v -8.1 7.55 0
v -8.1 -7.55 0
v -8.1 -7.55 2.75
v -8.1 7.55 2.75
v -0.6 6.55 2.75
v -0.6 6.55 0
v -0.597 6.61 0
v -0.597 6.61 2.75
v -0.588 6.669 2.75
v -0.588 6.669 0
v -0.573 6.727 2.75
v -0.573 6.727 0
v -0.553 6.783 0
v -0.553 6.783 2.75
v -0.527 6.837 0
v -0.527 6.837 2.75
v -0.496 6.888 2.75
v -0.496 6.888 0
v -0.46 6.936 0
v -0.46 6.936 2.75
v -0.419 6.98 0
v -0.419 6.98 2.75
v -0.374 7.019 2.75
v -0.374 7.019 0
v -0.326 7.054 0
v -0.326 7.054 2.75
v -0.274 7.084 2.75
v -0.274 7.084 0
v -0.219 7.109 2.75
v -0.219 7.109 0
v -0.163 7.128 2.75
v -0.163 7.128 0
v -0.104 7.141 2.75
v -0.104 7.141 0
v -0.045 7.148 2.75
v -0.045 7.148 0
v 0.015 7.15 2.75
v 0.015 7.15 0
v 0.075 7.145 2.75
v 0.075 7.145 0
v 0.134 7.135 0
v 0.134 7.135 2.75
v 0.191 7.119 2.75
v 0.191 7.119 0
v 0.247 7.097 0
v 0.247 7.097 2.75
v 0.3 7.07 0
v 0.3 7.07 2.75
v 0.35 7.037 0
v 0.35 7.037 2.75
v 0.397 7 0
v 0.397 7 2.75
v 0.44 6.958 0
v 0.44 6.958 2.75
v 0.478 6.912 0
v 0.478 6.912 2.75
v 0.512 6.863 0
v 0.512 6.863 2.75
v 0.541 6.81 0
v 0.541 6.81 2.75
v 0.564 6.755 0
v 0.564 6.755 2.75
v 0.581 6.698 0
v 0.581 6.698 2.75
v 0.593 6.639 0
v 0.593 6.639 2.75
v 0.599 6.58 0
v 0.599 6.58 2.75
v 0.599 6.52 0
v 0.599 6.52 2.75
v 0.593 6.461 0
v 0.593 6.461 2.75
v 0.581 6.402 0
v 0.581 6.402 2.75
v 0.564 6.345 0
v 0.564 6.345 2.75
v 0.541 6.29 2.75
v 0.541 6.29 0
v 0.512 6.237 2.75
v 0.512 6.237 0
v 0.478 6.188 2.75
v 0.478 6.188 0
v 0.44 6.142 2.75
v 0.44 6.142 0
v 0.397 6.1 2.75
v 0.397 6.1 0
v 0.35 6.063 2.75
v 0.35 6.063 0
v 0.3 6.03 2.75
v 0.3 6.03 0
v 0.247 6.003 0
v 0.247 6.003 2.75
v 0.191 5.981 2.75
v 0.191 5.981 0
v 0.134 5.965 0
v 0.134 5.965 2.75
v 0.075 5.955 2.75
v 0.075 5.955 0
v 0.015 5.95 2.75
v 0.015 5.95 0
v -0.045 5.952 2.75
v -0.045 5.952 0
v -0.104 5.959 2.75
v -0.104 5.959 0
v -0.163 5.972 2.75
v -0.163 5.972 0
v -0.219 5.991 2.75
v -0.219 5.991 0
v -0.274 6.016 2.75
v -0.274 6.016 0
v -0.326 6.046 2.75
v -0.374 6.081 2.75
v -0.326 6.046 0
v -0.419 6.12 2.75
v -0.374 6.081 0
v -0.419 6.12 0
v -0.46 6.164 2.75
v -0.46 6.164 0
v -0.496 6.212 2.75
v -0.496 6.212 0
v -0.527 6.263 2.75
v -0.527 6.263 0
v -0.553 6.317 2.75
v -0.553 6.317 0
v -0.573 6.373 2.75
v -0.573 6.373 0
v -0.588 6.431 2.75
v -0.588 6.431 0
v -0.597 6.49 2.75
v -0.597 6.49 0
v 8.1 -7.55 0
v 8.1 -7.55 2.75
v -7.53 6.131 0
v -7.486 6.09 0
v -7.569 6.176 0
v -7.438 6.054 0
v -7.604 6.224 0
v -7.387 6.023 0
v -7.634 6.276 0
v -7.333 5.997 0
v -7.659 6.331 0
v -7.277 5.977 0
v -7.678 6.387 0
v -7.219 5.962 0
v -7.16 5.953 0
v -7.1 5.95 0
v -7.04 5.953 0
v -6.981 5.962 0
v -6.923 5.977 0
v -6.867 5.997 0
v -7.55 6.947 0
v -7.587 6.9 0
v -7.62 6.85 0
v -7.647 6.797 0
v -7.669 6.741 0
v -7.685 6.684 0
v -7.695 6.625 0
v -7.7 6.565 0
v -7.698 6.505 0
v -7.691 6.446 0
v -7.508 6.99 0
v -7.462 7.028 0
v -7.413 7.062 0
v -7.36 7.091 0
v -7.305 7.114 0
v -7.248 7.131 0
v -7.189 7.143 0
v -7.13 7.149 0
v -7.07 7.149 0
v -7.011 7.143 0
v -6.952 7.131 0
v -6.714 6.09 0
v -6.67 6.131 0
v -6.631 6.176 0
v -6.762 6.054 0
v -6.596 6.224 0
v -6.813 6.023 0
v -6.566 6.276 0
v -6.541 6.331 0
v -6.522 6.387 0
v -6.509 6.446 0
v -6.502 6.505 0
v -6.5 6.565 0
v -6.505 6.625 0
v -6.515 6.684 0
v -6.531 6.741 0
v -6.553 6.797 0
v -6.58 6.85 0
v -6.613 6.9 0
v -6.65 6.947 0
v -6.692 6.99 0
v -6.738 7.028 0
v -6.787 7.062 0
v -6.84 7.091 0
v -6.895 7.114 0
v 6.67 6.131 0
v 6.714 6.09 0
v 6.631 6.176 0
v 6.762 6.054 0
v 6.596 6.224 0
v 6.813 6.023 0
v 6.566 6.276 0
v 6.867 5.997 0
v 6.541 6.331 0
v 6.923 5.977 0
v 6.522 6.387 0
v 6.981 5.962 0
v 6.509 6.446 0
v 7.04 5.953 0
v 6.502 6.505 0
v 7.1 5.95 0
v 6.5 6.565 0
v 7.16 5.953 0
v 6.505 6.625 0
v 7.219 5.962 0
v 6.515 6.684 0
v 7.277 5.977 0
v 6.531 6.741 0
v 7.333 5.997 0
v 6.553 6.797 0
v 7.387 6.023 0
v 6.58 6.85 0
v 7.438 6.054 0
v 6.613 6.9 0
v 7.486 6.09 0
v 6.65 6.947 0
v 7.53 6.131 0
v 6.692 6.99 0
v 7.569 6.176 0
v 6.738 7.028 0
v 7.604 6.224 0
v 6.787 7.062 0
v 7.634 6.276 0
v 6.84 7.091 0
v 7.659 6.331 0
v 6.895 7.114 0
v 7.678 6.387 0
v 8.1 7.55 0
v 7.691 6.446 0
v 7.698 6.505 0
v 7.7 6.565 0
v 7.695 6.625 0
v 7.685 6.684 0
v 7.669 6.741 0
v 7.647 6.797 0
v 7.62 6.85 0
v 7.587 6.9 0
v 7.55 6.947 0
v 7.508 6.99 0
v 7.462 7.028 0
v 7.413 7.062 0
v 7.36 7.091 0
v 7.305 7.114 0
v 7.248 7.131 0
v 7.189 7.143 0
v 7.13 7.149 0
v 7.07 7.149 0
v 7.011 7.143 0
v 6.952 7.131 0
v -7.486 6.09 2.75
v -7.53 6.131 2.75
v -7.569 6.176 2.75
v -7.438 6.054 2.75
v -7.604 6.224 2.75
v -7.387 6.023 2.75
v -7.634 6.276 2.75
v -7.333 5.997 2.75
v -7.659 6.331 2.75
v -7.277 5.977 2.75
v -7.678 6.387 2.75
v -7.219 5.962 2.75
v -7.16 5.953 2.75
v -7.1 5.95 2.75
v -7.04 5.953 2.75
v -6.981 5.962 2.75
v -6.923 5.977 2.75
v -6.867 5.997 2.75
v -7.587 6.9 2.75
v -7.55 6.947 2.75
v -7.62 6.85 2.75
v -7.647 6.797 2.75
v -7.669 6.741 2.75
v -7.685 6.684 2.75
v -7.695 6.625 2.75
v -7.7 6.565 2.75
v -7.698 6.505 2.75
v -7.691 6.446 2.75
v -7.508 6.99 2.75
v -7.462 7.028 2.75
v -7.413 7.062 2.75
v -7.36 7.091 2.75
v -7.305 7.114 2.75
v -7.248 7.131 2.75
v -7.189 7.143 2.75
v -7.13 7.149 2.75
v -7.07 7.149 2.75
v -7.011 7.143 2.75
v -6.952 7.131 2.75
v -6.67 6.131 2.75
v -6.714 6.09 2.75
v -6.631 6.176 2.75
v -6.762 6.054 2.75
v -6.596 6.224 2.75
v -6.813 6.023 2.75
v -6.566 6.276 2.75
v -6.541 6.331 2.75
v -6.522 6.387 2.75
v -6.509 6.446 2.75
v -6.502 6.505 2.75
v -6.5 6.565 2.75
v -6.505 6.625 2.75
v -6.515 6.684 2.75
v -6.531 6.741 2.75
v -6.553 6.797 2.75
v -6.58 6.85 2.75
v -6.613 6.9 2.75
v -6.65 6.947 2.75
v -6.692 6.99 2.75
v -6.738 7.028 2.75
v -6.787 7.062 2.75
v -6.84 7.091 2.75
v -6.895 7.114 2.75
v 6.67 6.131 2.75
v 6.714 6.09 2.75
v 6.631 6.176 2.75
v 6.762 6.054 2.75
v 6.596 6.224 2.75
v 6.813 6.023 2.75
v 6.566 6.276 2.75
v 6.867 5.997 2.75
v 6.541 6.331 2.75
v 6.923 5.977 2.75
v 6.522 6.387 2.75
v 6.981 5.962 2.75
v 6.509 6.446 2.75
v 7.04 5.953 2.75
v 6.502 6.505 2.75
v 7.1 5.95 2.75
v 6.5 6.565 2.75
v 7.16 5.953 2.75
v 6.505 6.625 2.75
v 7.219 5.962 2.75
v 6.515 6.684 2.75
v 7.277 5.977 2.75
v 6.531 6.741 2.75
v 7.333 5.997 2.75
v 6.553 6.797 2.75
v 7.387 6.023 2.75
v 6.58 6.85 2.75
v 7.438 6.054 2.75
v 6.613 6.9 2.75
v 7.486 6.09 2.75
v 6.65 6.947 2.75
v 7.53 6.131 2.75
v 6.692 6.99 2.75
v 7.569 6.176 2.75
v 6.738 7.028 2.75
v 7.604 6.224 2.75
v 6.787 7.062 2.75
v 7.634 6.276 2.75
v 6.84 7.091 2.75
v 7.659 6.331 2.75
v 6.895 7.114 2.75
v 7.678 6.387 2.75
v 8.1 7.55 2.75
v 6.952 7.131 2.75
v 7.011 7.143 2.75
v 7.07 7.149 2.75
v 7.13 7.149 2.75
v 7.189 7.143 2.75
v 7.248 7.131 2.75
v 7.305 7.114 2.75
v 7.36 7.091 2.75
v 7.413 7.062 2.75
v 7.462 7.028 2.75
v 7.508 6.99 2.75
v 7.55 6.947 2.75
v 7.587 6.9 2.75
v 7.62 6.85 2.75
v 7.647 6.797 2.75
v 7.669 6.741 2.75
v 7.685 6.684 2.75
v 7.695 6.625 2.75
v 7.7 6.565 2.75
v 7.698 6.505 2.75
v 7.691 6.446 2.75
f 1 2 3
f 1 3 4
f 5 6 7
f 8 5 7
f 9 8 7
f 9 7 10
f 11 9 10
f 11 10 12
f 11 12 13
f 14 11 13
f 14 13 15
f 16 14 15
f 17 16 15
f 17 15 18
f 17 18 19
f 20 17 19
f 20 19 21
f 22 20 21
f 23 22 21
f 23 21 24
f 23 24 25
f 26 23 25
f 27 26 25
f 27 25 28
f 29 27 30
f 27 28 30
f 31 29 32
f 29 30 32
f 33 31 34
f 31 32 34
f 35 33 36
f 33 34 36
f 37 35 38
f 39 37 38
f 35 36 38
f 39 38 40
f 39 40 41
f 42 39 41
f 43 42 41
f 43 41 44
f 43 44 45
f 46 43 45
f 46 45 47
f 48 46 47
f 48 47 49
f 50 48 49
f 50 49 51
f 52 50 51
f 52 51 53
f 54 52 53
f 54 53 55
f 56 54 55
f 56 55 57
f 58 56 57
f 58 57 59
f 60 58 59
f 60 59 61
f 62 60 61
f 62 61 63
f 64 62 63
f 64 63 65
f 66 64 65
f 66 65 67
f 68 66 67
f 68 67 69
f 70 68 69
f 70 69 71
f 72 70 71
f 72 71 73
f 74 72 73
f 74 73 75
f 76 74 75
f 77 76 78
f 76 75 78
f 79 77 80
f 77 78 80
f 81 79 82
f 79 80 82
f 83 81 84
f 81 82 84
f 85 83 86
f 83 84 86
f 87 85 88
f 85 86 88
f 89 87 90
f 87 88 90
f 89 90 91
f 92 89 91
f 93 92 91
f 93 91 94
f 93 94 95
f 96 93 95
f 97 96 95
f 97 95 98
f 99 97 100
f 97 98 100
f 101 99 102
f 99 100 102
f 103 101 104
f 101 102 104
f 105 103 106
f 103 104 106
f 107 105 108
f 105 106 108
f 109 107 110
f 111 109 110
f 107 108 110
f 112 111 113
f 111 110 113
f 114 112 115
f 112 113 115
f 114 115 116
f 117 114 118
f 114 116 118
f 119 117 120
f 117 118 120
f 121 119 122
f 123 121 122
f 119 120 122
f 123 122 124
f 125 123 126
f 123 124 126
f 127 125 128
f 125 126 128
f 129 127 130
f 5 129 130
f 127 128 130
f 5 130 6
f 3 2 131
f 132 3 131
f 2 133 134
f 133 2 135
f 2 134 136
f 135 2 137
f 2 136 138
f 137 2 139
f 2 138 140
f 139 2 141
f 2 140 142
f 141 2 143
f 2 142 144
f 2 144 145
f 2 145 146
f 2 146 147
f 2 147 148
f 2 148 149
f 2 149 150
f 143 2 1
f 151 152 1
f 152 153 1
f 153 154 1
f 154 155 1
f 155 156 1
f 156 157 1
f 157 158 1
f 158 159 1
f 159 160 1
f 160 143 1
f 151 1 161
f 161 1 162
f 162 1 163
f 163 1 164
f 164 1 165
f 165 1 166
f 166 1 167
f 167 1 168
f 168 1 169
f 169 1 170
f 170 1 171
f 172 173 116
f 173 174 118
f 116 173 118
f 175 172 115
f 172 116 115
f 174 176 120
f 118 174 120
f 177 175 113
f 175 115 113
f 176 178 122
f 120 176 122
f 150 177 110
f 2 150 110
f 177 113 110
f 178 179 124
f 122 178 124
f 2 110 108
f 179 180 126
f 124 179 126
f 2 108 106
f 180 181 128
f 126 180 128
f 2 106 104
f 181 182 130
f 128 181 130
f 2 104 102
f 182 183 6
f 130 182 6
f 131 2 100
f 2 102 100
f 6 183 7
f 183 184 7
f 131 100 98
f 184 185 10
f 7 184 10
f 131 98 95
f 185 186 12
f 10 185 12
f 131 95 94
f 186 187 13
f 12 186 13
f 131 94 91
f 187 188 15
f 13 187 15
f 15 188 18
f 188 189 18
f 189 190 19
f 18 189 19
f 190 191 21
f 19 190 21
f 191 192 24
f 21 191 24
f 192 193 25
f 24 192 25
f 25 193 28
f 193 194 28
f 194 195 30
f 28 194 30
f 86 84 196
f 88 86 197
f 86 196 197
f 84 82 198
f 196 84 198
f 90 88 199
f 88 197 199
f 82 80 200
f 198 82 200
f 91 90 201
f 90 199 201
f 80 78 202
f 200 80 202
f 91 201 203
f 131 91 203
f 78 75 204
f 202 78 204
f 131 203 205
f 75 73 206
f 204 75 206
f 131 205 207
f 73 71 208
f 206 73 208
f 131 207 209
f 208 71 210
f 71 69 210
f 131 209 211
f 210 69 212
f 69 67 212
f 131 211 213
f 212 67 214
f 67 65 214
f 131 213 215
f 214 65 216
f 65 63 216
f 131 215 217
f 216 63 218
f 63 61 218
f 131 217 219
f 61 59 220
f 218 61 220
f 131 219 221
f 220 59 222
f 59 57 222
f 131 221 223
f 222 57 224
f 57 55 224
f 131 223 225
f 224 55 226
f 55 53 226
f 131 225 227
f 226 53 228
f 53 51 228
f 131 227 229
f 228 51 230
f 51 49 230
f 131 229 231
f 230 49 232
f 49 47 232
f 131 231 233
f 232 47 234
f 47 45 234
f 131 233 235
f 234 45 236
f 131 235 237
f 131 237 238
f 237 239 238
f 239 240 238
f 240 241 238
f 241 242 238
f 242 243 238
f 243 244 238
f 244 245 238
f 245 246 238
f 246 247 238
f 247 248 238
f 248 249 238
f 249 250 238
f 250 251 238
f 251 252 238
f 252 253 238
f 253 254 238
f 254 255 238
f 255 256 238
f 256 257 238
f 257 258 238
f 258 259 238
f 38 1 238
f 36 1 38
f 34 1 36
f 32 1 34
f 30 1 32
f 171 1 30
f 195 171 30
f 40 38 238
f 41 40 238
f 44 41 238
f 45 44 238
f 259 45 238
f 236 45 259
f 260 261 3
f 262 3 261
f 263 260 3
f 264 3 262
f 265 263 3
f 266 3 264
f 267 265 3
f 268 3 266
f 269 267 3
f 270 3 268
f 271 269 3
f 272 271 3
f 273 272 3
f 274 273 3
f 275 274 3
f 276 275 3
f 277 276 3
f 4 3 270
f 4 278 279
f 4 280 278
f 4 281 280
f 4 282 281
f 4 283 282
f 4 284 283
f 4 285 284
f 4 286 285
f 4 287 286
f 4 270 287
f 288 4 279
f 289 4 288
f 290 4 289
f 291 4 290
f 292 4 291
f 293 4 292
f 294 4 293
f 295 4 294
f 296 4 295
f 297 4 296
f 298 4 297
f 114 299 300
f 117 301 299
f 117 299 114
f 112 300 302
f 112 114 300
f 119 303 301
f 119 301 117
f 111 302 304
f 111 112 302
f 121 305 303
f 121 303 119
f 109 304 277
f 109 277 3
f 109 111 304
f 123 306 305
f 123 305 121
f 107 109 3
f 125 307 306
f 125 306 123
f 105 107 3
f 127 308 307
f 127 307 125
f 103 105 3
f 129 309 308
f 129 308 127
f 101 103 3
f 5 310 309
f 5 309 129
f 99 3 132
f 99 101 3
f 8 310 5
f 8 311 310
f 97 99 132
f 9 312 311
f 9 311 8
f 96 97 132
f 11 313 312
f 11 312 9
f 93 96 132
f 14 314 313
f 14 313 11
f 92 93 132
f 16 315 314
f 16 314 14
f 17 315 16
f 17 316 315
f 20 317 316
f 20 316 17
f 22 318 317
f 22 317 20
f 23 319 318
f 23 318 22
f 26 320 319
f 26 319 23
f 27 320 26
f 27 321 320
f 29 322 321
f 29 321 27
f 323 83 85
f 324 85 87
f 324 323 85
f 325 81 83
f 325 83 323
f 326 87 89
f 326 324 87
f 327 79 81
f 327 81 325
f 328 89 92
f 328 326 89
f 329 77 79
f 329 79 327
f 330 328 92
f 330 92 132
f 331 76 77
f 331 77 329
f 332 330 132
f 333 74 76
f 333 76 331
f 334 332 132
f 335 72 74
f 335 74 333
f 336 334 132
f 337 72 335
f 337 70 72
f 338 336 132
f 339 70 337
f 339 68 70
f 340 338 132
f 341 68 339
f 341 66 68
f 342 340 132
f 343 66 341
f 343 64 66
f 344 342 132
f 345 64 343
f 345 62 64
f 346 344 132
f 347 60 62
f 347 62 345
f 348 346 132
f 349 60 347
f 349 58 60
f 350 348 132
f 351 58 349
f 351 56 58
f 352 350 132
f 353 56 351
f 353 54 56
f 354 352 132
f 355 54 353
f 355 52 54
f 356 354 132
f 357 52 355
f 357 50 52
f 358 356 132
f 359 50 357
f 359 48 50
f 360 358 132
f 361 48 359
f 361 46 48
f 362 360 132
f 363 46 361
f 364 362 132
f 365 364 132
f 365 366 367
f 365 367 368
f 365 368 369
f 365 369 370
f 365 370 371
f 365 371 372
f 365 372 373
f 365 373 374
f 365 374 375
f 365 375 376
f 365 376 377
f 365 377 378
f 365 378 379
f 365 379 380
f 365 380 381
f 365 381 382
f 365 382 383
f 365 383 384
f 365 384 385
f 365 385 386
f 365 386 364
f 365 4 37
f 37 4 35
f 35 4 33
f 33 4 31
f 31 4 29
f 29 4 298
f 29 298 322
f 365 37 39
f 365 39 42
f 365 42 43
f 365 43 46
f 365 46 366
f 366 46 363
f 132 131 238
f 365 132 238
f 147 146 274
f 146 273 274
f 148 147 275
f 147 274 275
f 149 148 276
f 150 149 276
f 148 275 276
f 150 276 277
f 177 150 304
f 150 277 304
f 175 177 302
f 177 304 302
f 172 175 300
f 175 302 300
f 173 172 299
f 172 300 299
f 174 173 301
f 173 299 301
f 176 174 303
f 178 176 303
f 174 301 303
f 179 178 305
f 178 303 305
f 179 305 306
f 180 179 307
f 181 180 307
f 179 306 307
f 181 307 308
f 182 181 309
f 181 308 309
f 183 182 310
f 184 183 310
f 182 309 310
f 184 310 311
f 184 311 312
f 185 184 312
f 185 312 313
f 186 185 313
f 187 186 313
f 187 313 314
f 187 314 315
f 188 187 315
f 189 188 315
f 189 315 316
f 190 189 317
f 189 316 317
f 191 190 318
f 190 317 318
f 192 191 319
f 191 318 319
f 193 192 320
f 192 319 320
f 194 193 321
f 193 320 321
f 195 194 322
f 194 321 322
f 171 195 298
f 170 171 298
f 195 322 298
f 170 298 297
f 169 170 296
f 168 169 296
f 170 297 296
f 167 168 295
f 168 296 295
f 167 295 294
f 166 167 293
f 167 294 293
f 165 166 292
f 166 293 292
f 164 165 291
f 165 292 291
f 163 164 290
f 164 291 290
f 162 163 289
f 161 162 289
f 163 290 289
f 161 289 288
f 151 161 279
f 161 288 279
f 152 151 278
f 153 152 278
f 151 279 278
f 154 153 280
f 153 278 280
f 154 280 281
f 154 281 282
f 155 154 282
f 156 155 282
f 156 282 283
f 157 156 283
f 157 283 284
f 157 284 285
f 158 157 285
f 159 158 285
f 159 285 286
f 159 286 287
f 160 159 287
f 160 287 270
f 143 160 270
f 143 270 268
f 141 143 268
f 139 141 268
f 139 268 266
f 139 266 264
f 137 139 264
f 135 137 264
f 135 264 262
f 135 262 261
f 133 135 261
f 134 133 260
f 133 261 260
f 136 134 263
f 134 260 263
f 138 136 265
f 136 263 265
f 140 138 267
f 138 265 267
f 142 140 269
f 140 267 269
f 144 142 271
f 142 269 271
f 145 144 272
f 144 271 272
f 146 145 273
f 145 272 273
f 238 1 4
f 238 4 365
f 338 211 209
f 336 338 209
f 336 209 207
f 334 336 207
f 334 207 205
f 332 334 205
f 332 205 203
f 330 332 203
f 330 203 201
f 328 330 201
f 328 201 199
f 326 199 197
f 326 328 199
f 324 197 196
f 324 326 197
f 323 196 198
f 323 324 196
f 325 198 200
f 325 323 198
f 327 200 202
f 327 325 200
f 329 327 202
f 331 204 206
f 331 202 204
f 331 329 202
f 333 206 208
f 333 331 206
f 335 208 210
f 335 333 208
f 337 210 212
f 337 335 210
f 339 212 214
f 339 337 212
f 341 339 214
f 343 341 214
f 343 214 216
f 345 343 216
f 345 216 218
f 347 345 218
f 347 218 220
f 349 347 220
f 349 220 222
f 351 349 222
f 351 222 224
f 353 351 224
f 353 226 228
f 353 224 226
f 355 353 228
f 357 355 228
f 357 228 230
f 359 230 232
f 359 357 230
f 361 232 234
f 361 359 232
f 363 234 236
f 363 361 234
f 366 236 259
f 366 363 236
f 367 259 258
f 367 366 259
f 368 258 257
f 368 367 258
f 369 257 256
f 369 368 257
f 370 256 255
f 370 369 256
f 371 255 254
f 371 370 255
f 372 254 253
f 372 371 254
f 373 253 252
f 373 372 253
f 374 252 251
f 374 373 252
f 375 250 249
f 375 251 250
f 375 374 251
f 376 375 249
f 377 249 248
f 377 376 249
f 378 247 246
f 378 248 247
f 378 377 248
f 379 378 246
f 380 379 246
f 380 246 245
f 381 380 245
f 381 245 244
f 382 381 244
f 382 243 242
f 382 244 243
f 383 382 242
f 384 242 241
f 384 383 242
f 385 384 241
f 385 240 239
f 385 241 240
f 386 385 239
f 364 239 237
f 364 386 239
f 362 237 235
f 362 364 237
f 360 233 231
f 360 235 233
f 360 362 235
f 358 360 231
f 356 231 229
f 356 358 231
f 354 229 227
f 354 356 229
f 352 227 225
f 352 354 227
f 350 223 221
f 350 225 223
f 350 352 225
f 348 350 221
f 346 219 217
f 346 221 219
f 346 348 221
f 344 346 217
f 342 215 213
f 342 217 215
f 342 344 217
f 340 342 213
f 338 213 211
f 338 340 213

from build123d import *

# Parameters (mm, degrees)
SKETCH1_W                = 16.2
SKETCH1_H                = 15.1
BOSS_EXTRUDE1_DEPTH      = 2.75
M1_CLEARANCE_HOLE2_D     = 1.2
M1_CLEARANCE_HOLE2_DEPTH = 2.75


with BuildPart() as part:
    # Sketch1 → Boss-Extrude1 (new body)
    with BuildSketch(Plane.XY):
        Rectangle(SKETCH1_W, SKETCH1_H)
    extrude(amount=BOSS_EXTRUDE1_DEPTH)

    # Sketch3 → M1 Clearance Hole1 (revolve, cut)
    with BuildSketch(Plane(origin=(7.1, 6.55, 2.75), x_dir=(0, -1, 0), z_dir=(1, 0, 0))):
        Polygon((0, 0), (0, 3.510516371), (0.6, 3.15), (0.6, 0), align=None)
    m1_clearance_hole1 = revolve(axis=Axis((7.1, 6.55, 9.1), (0, 0, -1)), mode=Mode.SUBTRACT)

    # Mirror1: M1 Clearance Hole1 across plane
    add(m1_clearance_hole1.mirror(Plane(origin=(0, 0, 0), x_dir=(0, 0, 1), z_dir=(1, 0, 0))), mode=Mode.SUBTRACT)

    # M1 Clearance Hole2
    with Locations(Plane.XY.offset(2.75)):
        with Locations((0, 6.55)):
            Hole(M1_CLEARANCE_HOLE2_D / 2, depth=M1_CLEARANCE_HOLE2_DEPTH)


solid = part.part
